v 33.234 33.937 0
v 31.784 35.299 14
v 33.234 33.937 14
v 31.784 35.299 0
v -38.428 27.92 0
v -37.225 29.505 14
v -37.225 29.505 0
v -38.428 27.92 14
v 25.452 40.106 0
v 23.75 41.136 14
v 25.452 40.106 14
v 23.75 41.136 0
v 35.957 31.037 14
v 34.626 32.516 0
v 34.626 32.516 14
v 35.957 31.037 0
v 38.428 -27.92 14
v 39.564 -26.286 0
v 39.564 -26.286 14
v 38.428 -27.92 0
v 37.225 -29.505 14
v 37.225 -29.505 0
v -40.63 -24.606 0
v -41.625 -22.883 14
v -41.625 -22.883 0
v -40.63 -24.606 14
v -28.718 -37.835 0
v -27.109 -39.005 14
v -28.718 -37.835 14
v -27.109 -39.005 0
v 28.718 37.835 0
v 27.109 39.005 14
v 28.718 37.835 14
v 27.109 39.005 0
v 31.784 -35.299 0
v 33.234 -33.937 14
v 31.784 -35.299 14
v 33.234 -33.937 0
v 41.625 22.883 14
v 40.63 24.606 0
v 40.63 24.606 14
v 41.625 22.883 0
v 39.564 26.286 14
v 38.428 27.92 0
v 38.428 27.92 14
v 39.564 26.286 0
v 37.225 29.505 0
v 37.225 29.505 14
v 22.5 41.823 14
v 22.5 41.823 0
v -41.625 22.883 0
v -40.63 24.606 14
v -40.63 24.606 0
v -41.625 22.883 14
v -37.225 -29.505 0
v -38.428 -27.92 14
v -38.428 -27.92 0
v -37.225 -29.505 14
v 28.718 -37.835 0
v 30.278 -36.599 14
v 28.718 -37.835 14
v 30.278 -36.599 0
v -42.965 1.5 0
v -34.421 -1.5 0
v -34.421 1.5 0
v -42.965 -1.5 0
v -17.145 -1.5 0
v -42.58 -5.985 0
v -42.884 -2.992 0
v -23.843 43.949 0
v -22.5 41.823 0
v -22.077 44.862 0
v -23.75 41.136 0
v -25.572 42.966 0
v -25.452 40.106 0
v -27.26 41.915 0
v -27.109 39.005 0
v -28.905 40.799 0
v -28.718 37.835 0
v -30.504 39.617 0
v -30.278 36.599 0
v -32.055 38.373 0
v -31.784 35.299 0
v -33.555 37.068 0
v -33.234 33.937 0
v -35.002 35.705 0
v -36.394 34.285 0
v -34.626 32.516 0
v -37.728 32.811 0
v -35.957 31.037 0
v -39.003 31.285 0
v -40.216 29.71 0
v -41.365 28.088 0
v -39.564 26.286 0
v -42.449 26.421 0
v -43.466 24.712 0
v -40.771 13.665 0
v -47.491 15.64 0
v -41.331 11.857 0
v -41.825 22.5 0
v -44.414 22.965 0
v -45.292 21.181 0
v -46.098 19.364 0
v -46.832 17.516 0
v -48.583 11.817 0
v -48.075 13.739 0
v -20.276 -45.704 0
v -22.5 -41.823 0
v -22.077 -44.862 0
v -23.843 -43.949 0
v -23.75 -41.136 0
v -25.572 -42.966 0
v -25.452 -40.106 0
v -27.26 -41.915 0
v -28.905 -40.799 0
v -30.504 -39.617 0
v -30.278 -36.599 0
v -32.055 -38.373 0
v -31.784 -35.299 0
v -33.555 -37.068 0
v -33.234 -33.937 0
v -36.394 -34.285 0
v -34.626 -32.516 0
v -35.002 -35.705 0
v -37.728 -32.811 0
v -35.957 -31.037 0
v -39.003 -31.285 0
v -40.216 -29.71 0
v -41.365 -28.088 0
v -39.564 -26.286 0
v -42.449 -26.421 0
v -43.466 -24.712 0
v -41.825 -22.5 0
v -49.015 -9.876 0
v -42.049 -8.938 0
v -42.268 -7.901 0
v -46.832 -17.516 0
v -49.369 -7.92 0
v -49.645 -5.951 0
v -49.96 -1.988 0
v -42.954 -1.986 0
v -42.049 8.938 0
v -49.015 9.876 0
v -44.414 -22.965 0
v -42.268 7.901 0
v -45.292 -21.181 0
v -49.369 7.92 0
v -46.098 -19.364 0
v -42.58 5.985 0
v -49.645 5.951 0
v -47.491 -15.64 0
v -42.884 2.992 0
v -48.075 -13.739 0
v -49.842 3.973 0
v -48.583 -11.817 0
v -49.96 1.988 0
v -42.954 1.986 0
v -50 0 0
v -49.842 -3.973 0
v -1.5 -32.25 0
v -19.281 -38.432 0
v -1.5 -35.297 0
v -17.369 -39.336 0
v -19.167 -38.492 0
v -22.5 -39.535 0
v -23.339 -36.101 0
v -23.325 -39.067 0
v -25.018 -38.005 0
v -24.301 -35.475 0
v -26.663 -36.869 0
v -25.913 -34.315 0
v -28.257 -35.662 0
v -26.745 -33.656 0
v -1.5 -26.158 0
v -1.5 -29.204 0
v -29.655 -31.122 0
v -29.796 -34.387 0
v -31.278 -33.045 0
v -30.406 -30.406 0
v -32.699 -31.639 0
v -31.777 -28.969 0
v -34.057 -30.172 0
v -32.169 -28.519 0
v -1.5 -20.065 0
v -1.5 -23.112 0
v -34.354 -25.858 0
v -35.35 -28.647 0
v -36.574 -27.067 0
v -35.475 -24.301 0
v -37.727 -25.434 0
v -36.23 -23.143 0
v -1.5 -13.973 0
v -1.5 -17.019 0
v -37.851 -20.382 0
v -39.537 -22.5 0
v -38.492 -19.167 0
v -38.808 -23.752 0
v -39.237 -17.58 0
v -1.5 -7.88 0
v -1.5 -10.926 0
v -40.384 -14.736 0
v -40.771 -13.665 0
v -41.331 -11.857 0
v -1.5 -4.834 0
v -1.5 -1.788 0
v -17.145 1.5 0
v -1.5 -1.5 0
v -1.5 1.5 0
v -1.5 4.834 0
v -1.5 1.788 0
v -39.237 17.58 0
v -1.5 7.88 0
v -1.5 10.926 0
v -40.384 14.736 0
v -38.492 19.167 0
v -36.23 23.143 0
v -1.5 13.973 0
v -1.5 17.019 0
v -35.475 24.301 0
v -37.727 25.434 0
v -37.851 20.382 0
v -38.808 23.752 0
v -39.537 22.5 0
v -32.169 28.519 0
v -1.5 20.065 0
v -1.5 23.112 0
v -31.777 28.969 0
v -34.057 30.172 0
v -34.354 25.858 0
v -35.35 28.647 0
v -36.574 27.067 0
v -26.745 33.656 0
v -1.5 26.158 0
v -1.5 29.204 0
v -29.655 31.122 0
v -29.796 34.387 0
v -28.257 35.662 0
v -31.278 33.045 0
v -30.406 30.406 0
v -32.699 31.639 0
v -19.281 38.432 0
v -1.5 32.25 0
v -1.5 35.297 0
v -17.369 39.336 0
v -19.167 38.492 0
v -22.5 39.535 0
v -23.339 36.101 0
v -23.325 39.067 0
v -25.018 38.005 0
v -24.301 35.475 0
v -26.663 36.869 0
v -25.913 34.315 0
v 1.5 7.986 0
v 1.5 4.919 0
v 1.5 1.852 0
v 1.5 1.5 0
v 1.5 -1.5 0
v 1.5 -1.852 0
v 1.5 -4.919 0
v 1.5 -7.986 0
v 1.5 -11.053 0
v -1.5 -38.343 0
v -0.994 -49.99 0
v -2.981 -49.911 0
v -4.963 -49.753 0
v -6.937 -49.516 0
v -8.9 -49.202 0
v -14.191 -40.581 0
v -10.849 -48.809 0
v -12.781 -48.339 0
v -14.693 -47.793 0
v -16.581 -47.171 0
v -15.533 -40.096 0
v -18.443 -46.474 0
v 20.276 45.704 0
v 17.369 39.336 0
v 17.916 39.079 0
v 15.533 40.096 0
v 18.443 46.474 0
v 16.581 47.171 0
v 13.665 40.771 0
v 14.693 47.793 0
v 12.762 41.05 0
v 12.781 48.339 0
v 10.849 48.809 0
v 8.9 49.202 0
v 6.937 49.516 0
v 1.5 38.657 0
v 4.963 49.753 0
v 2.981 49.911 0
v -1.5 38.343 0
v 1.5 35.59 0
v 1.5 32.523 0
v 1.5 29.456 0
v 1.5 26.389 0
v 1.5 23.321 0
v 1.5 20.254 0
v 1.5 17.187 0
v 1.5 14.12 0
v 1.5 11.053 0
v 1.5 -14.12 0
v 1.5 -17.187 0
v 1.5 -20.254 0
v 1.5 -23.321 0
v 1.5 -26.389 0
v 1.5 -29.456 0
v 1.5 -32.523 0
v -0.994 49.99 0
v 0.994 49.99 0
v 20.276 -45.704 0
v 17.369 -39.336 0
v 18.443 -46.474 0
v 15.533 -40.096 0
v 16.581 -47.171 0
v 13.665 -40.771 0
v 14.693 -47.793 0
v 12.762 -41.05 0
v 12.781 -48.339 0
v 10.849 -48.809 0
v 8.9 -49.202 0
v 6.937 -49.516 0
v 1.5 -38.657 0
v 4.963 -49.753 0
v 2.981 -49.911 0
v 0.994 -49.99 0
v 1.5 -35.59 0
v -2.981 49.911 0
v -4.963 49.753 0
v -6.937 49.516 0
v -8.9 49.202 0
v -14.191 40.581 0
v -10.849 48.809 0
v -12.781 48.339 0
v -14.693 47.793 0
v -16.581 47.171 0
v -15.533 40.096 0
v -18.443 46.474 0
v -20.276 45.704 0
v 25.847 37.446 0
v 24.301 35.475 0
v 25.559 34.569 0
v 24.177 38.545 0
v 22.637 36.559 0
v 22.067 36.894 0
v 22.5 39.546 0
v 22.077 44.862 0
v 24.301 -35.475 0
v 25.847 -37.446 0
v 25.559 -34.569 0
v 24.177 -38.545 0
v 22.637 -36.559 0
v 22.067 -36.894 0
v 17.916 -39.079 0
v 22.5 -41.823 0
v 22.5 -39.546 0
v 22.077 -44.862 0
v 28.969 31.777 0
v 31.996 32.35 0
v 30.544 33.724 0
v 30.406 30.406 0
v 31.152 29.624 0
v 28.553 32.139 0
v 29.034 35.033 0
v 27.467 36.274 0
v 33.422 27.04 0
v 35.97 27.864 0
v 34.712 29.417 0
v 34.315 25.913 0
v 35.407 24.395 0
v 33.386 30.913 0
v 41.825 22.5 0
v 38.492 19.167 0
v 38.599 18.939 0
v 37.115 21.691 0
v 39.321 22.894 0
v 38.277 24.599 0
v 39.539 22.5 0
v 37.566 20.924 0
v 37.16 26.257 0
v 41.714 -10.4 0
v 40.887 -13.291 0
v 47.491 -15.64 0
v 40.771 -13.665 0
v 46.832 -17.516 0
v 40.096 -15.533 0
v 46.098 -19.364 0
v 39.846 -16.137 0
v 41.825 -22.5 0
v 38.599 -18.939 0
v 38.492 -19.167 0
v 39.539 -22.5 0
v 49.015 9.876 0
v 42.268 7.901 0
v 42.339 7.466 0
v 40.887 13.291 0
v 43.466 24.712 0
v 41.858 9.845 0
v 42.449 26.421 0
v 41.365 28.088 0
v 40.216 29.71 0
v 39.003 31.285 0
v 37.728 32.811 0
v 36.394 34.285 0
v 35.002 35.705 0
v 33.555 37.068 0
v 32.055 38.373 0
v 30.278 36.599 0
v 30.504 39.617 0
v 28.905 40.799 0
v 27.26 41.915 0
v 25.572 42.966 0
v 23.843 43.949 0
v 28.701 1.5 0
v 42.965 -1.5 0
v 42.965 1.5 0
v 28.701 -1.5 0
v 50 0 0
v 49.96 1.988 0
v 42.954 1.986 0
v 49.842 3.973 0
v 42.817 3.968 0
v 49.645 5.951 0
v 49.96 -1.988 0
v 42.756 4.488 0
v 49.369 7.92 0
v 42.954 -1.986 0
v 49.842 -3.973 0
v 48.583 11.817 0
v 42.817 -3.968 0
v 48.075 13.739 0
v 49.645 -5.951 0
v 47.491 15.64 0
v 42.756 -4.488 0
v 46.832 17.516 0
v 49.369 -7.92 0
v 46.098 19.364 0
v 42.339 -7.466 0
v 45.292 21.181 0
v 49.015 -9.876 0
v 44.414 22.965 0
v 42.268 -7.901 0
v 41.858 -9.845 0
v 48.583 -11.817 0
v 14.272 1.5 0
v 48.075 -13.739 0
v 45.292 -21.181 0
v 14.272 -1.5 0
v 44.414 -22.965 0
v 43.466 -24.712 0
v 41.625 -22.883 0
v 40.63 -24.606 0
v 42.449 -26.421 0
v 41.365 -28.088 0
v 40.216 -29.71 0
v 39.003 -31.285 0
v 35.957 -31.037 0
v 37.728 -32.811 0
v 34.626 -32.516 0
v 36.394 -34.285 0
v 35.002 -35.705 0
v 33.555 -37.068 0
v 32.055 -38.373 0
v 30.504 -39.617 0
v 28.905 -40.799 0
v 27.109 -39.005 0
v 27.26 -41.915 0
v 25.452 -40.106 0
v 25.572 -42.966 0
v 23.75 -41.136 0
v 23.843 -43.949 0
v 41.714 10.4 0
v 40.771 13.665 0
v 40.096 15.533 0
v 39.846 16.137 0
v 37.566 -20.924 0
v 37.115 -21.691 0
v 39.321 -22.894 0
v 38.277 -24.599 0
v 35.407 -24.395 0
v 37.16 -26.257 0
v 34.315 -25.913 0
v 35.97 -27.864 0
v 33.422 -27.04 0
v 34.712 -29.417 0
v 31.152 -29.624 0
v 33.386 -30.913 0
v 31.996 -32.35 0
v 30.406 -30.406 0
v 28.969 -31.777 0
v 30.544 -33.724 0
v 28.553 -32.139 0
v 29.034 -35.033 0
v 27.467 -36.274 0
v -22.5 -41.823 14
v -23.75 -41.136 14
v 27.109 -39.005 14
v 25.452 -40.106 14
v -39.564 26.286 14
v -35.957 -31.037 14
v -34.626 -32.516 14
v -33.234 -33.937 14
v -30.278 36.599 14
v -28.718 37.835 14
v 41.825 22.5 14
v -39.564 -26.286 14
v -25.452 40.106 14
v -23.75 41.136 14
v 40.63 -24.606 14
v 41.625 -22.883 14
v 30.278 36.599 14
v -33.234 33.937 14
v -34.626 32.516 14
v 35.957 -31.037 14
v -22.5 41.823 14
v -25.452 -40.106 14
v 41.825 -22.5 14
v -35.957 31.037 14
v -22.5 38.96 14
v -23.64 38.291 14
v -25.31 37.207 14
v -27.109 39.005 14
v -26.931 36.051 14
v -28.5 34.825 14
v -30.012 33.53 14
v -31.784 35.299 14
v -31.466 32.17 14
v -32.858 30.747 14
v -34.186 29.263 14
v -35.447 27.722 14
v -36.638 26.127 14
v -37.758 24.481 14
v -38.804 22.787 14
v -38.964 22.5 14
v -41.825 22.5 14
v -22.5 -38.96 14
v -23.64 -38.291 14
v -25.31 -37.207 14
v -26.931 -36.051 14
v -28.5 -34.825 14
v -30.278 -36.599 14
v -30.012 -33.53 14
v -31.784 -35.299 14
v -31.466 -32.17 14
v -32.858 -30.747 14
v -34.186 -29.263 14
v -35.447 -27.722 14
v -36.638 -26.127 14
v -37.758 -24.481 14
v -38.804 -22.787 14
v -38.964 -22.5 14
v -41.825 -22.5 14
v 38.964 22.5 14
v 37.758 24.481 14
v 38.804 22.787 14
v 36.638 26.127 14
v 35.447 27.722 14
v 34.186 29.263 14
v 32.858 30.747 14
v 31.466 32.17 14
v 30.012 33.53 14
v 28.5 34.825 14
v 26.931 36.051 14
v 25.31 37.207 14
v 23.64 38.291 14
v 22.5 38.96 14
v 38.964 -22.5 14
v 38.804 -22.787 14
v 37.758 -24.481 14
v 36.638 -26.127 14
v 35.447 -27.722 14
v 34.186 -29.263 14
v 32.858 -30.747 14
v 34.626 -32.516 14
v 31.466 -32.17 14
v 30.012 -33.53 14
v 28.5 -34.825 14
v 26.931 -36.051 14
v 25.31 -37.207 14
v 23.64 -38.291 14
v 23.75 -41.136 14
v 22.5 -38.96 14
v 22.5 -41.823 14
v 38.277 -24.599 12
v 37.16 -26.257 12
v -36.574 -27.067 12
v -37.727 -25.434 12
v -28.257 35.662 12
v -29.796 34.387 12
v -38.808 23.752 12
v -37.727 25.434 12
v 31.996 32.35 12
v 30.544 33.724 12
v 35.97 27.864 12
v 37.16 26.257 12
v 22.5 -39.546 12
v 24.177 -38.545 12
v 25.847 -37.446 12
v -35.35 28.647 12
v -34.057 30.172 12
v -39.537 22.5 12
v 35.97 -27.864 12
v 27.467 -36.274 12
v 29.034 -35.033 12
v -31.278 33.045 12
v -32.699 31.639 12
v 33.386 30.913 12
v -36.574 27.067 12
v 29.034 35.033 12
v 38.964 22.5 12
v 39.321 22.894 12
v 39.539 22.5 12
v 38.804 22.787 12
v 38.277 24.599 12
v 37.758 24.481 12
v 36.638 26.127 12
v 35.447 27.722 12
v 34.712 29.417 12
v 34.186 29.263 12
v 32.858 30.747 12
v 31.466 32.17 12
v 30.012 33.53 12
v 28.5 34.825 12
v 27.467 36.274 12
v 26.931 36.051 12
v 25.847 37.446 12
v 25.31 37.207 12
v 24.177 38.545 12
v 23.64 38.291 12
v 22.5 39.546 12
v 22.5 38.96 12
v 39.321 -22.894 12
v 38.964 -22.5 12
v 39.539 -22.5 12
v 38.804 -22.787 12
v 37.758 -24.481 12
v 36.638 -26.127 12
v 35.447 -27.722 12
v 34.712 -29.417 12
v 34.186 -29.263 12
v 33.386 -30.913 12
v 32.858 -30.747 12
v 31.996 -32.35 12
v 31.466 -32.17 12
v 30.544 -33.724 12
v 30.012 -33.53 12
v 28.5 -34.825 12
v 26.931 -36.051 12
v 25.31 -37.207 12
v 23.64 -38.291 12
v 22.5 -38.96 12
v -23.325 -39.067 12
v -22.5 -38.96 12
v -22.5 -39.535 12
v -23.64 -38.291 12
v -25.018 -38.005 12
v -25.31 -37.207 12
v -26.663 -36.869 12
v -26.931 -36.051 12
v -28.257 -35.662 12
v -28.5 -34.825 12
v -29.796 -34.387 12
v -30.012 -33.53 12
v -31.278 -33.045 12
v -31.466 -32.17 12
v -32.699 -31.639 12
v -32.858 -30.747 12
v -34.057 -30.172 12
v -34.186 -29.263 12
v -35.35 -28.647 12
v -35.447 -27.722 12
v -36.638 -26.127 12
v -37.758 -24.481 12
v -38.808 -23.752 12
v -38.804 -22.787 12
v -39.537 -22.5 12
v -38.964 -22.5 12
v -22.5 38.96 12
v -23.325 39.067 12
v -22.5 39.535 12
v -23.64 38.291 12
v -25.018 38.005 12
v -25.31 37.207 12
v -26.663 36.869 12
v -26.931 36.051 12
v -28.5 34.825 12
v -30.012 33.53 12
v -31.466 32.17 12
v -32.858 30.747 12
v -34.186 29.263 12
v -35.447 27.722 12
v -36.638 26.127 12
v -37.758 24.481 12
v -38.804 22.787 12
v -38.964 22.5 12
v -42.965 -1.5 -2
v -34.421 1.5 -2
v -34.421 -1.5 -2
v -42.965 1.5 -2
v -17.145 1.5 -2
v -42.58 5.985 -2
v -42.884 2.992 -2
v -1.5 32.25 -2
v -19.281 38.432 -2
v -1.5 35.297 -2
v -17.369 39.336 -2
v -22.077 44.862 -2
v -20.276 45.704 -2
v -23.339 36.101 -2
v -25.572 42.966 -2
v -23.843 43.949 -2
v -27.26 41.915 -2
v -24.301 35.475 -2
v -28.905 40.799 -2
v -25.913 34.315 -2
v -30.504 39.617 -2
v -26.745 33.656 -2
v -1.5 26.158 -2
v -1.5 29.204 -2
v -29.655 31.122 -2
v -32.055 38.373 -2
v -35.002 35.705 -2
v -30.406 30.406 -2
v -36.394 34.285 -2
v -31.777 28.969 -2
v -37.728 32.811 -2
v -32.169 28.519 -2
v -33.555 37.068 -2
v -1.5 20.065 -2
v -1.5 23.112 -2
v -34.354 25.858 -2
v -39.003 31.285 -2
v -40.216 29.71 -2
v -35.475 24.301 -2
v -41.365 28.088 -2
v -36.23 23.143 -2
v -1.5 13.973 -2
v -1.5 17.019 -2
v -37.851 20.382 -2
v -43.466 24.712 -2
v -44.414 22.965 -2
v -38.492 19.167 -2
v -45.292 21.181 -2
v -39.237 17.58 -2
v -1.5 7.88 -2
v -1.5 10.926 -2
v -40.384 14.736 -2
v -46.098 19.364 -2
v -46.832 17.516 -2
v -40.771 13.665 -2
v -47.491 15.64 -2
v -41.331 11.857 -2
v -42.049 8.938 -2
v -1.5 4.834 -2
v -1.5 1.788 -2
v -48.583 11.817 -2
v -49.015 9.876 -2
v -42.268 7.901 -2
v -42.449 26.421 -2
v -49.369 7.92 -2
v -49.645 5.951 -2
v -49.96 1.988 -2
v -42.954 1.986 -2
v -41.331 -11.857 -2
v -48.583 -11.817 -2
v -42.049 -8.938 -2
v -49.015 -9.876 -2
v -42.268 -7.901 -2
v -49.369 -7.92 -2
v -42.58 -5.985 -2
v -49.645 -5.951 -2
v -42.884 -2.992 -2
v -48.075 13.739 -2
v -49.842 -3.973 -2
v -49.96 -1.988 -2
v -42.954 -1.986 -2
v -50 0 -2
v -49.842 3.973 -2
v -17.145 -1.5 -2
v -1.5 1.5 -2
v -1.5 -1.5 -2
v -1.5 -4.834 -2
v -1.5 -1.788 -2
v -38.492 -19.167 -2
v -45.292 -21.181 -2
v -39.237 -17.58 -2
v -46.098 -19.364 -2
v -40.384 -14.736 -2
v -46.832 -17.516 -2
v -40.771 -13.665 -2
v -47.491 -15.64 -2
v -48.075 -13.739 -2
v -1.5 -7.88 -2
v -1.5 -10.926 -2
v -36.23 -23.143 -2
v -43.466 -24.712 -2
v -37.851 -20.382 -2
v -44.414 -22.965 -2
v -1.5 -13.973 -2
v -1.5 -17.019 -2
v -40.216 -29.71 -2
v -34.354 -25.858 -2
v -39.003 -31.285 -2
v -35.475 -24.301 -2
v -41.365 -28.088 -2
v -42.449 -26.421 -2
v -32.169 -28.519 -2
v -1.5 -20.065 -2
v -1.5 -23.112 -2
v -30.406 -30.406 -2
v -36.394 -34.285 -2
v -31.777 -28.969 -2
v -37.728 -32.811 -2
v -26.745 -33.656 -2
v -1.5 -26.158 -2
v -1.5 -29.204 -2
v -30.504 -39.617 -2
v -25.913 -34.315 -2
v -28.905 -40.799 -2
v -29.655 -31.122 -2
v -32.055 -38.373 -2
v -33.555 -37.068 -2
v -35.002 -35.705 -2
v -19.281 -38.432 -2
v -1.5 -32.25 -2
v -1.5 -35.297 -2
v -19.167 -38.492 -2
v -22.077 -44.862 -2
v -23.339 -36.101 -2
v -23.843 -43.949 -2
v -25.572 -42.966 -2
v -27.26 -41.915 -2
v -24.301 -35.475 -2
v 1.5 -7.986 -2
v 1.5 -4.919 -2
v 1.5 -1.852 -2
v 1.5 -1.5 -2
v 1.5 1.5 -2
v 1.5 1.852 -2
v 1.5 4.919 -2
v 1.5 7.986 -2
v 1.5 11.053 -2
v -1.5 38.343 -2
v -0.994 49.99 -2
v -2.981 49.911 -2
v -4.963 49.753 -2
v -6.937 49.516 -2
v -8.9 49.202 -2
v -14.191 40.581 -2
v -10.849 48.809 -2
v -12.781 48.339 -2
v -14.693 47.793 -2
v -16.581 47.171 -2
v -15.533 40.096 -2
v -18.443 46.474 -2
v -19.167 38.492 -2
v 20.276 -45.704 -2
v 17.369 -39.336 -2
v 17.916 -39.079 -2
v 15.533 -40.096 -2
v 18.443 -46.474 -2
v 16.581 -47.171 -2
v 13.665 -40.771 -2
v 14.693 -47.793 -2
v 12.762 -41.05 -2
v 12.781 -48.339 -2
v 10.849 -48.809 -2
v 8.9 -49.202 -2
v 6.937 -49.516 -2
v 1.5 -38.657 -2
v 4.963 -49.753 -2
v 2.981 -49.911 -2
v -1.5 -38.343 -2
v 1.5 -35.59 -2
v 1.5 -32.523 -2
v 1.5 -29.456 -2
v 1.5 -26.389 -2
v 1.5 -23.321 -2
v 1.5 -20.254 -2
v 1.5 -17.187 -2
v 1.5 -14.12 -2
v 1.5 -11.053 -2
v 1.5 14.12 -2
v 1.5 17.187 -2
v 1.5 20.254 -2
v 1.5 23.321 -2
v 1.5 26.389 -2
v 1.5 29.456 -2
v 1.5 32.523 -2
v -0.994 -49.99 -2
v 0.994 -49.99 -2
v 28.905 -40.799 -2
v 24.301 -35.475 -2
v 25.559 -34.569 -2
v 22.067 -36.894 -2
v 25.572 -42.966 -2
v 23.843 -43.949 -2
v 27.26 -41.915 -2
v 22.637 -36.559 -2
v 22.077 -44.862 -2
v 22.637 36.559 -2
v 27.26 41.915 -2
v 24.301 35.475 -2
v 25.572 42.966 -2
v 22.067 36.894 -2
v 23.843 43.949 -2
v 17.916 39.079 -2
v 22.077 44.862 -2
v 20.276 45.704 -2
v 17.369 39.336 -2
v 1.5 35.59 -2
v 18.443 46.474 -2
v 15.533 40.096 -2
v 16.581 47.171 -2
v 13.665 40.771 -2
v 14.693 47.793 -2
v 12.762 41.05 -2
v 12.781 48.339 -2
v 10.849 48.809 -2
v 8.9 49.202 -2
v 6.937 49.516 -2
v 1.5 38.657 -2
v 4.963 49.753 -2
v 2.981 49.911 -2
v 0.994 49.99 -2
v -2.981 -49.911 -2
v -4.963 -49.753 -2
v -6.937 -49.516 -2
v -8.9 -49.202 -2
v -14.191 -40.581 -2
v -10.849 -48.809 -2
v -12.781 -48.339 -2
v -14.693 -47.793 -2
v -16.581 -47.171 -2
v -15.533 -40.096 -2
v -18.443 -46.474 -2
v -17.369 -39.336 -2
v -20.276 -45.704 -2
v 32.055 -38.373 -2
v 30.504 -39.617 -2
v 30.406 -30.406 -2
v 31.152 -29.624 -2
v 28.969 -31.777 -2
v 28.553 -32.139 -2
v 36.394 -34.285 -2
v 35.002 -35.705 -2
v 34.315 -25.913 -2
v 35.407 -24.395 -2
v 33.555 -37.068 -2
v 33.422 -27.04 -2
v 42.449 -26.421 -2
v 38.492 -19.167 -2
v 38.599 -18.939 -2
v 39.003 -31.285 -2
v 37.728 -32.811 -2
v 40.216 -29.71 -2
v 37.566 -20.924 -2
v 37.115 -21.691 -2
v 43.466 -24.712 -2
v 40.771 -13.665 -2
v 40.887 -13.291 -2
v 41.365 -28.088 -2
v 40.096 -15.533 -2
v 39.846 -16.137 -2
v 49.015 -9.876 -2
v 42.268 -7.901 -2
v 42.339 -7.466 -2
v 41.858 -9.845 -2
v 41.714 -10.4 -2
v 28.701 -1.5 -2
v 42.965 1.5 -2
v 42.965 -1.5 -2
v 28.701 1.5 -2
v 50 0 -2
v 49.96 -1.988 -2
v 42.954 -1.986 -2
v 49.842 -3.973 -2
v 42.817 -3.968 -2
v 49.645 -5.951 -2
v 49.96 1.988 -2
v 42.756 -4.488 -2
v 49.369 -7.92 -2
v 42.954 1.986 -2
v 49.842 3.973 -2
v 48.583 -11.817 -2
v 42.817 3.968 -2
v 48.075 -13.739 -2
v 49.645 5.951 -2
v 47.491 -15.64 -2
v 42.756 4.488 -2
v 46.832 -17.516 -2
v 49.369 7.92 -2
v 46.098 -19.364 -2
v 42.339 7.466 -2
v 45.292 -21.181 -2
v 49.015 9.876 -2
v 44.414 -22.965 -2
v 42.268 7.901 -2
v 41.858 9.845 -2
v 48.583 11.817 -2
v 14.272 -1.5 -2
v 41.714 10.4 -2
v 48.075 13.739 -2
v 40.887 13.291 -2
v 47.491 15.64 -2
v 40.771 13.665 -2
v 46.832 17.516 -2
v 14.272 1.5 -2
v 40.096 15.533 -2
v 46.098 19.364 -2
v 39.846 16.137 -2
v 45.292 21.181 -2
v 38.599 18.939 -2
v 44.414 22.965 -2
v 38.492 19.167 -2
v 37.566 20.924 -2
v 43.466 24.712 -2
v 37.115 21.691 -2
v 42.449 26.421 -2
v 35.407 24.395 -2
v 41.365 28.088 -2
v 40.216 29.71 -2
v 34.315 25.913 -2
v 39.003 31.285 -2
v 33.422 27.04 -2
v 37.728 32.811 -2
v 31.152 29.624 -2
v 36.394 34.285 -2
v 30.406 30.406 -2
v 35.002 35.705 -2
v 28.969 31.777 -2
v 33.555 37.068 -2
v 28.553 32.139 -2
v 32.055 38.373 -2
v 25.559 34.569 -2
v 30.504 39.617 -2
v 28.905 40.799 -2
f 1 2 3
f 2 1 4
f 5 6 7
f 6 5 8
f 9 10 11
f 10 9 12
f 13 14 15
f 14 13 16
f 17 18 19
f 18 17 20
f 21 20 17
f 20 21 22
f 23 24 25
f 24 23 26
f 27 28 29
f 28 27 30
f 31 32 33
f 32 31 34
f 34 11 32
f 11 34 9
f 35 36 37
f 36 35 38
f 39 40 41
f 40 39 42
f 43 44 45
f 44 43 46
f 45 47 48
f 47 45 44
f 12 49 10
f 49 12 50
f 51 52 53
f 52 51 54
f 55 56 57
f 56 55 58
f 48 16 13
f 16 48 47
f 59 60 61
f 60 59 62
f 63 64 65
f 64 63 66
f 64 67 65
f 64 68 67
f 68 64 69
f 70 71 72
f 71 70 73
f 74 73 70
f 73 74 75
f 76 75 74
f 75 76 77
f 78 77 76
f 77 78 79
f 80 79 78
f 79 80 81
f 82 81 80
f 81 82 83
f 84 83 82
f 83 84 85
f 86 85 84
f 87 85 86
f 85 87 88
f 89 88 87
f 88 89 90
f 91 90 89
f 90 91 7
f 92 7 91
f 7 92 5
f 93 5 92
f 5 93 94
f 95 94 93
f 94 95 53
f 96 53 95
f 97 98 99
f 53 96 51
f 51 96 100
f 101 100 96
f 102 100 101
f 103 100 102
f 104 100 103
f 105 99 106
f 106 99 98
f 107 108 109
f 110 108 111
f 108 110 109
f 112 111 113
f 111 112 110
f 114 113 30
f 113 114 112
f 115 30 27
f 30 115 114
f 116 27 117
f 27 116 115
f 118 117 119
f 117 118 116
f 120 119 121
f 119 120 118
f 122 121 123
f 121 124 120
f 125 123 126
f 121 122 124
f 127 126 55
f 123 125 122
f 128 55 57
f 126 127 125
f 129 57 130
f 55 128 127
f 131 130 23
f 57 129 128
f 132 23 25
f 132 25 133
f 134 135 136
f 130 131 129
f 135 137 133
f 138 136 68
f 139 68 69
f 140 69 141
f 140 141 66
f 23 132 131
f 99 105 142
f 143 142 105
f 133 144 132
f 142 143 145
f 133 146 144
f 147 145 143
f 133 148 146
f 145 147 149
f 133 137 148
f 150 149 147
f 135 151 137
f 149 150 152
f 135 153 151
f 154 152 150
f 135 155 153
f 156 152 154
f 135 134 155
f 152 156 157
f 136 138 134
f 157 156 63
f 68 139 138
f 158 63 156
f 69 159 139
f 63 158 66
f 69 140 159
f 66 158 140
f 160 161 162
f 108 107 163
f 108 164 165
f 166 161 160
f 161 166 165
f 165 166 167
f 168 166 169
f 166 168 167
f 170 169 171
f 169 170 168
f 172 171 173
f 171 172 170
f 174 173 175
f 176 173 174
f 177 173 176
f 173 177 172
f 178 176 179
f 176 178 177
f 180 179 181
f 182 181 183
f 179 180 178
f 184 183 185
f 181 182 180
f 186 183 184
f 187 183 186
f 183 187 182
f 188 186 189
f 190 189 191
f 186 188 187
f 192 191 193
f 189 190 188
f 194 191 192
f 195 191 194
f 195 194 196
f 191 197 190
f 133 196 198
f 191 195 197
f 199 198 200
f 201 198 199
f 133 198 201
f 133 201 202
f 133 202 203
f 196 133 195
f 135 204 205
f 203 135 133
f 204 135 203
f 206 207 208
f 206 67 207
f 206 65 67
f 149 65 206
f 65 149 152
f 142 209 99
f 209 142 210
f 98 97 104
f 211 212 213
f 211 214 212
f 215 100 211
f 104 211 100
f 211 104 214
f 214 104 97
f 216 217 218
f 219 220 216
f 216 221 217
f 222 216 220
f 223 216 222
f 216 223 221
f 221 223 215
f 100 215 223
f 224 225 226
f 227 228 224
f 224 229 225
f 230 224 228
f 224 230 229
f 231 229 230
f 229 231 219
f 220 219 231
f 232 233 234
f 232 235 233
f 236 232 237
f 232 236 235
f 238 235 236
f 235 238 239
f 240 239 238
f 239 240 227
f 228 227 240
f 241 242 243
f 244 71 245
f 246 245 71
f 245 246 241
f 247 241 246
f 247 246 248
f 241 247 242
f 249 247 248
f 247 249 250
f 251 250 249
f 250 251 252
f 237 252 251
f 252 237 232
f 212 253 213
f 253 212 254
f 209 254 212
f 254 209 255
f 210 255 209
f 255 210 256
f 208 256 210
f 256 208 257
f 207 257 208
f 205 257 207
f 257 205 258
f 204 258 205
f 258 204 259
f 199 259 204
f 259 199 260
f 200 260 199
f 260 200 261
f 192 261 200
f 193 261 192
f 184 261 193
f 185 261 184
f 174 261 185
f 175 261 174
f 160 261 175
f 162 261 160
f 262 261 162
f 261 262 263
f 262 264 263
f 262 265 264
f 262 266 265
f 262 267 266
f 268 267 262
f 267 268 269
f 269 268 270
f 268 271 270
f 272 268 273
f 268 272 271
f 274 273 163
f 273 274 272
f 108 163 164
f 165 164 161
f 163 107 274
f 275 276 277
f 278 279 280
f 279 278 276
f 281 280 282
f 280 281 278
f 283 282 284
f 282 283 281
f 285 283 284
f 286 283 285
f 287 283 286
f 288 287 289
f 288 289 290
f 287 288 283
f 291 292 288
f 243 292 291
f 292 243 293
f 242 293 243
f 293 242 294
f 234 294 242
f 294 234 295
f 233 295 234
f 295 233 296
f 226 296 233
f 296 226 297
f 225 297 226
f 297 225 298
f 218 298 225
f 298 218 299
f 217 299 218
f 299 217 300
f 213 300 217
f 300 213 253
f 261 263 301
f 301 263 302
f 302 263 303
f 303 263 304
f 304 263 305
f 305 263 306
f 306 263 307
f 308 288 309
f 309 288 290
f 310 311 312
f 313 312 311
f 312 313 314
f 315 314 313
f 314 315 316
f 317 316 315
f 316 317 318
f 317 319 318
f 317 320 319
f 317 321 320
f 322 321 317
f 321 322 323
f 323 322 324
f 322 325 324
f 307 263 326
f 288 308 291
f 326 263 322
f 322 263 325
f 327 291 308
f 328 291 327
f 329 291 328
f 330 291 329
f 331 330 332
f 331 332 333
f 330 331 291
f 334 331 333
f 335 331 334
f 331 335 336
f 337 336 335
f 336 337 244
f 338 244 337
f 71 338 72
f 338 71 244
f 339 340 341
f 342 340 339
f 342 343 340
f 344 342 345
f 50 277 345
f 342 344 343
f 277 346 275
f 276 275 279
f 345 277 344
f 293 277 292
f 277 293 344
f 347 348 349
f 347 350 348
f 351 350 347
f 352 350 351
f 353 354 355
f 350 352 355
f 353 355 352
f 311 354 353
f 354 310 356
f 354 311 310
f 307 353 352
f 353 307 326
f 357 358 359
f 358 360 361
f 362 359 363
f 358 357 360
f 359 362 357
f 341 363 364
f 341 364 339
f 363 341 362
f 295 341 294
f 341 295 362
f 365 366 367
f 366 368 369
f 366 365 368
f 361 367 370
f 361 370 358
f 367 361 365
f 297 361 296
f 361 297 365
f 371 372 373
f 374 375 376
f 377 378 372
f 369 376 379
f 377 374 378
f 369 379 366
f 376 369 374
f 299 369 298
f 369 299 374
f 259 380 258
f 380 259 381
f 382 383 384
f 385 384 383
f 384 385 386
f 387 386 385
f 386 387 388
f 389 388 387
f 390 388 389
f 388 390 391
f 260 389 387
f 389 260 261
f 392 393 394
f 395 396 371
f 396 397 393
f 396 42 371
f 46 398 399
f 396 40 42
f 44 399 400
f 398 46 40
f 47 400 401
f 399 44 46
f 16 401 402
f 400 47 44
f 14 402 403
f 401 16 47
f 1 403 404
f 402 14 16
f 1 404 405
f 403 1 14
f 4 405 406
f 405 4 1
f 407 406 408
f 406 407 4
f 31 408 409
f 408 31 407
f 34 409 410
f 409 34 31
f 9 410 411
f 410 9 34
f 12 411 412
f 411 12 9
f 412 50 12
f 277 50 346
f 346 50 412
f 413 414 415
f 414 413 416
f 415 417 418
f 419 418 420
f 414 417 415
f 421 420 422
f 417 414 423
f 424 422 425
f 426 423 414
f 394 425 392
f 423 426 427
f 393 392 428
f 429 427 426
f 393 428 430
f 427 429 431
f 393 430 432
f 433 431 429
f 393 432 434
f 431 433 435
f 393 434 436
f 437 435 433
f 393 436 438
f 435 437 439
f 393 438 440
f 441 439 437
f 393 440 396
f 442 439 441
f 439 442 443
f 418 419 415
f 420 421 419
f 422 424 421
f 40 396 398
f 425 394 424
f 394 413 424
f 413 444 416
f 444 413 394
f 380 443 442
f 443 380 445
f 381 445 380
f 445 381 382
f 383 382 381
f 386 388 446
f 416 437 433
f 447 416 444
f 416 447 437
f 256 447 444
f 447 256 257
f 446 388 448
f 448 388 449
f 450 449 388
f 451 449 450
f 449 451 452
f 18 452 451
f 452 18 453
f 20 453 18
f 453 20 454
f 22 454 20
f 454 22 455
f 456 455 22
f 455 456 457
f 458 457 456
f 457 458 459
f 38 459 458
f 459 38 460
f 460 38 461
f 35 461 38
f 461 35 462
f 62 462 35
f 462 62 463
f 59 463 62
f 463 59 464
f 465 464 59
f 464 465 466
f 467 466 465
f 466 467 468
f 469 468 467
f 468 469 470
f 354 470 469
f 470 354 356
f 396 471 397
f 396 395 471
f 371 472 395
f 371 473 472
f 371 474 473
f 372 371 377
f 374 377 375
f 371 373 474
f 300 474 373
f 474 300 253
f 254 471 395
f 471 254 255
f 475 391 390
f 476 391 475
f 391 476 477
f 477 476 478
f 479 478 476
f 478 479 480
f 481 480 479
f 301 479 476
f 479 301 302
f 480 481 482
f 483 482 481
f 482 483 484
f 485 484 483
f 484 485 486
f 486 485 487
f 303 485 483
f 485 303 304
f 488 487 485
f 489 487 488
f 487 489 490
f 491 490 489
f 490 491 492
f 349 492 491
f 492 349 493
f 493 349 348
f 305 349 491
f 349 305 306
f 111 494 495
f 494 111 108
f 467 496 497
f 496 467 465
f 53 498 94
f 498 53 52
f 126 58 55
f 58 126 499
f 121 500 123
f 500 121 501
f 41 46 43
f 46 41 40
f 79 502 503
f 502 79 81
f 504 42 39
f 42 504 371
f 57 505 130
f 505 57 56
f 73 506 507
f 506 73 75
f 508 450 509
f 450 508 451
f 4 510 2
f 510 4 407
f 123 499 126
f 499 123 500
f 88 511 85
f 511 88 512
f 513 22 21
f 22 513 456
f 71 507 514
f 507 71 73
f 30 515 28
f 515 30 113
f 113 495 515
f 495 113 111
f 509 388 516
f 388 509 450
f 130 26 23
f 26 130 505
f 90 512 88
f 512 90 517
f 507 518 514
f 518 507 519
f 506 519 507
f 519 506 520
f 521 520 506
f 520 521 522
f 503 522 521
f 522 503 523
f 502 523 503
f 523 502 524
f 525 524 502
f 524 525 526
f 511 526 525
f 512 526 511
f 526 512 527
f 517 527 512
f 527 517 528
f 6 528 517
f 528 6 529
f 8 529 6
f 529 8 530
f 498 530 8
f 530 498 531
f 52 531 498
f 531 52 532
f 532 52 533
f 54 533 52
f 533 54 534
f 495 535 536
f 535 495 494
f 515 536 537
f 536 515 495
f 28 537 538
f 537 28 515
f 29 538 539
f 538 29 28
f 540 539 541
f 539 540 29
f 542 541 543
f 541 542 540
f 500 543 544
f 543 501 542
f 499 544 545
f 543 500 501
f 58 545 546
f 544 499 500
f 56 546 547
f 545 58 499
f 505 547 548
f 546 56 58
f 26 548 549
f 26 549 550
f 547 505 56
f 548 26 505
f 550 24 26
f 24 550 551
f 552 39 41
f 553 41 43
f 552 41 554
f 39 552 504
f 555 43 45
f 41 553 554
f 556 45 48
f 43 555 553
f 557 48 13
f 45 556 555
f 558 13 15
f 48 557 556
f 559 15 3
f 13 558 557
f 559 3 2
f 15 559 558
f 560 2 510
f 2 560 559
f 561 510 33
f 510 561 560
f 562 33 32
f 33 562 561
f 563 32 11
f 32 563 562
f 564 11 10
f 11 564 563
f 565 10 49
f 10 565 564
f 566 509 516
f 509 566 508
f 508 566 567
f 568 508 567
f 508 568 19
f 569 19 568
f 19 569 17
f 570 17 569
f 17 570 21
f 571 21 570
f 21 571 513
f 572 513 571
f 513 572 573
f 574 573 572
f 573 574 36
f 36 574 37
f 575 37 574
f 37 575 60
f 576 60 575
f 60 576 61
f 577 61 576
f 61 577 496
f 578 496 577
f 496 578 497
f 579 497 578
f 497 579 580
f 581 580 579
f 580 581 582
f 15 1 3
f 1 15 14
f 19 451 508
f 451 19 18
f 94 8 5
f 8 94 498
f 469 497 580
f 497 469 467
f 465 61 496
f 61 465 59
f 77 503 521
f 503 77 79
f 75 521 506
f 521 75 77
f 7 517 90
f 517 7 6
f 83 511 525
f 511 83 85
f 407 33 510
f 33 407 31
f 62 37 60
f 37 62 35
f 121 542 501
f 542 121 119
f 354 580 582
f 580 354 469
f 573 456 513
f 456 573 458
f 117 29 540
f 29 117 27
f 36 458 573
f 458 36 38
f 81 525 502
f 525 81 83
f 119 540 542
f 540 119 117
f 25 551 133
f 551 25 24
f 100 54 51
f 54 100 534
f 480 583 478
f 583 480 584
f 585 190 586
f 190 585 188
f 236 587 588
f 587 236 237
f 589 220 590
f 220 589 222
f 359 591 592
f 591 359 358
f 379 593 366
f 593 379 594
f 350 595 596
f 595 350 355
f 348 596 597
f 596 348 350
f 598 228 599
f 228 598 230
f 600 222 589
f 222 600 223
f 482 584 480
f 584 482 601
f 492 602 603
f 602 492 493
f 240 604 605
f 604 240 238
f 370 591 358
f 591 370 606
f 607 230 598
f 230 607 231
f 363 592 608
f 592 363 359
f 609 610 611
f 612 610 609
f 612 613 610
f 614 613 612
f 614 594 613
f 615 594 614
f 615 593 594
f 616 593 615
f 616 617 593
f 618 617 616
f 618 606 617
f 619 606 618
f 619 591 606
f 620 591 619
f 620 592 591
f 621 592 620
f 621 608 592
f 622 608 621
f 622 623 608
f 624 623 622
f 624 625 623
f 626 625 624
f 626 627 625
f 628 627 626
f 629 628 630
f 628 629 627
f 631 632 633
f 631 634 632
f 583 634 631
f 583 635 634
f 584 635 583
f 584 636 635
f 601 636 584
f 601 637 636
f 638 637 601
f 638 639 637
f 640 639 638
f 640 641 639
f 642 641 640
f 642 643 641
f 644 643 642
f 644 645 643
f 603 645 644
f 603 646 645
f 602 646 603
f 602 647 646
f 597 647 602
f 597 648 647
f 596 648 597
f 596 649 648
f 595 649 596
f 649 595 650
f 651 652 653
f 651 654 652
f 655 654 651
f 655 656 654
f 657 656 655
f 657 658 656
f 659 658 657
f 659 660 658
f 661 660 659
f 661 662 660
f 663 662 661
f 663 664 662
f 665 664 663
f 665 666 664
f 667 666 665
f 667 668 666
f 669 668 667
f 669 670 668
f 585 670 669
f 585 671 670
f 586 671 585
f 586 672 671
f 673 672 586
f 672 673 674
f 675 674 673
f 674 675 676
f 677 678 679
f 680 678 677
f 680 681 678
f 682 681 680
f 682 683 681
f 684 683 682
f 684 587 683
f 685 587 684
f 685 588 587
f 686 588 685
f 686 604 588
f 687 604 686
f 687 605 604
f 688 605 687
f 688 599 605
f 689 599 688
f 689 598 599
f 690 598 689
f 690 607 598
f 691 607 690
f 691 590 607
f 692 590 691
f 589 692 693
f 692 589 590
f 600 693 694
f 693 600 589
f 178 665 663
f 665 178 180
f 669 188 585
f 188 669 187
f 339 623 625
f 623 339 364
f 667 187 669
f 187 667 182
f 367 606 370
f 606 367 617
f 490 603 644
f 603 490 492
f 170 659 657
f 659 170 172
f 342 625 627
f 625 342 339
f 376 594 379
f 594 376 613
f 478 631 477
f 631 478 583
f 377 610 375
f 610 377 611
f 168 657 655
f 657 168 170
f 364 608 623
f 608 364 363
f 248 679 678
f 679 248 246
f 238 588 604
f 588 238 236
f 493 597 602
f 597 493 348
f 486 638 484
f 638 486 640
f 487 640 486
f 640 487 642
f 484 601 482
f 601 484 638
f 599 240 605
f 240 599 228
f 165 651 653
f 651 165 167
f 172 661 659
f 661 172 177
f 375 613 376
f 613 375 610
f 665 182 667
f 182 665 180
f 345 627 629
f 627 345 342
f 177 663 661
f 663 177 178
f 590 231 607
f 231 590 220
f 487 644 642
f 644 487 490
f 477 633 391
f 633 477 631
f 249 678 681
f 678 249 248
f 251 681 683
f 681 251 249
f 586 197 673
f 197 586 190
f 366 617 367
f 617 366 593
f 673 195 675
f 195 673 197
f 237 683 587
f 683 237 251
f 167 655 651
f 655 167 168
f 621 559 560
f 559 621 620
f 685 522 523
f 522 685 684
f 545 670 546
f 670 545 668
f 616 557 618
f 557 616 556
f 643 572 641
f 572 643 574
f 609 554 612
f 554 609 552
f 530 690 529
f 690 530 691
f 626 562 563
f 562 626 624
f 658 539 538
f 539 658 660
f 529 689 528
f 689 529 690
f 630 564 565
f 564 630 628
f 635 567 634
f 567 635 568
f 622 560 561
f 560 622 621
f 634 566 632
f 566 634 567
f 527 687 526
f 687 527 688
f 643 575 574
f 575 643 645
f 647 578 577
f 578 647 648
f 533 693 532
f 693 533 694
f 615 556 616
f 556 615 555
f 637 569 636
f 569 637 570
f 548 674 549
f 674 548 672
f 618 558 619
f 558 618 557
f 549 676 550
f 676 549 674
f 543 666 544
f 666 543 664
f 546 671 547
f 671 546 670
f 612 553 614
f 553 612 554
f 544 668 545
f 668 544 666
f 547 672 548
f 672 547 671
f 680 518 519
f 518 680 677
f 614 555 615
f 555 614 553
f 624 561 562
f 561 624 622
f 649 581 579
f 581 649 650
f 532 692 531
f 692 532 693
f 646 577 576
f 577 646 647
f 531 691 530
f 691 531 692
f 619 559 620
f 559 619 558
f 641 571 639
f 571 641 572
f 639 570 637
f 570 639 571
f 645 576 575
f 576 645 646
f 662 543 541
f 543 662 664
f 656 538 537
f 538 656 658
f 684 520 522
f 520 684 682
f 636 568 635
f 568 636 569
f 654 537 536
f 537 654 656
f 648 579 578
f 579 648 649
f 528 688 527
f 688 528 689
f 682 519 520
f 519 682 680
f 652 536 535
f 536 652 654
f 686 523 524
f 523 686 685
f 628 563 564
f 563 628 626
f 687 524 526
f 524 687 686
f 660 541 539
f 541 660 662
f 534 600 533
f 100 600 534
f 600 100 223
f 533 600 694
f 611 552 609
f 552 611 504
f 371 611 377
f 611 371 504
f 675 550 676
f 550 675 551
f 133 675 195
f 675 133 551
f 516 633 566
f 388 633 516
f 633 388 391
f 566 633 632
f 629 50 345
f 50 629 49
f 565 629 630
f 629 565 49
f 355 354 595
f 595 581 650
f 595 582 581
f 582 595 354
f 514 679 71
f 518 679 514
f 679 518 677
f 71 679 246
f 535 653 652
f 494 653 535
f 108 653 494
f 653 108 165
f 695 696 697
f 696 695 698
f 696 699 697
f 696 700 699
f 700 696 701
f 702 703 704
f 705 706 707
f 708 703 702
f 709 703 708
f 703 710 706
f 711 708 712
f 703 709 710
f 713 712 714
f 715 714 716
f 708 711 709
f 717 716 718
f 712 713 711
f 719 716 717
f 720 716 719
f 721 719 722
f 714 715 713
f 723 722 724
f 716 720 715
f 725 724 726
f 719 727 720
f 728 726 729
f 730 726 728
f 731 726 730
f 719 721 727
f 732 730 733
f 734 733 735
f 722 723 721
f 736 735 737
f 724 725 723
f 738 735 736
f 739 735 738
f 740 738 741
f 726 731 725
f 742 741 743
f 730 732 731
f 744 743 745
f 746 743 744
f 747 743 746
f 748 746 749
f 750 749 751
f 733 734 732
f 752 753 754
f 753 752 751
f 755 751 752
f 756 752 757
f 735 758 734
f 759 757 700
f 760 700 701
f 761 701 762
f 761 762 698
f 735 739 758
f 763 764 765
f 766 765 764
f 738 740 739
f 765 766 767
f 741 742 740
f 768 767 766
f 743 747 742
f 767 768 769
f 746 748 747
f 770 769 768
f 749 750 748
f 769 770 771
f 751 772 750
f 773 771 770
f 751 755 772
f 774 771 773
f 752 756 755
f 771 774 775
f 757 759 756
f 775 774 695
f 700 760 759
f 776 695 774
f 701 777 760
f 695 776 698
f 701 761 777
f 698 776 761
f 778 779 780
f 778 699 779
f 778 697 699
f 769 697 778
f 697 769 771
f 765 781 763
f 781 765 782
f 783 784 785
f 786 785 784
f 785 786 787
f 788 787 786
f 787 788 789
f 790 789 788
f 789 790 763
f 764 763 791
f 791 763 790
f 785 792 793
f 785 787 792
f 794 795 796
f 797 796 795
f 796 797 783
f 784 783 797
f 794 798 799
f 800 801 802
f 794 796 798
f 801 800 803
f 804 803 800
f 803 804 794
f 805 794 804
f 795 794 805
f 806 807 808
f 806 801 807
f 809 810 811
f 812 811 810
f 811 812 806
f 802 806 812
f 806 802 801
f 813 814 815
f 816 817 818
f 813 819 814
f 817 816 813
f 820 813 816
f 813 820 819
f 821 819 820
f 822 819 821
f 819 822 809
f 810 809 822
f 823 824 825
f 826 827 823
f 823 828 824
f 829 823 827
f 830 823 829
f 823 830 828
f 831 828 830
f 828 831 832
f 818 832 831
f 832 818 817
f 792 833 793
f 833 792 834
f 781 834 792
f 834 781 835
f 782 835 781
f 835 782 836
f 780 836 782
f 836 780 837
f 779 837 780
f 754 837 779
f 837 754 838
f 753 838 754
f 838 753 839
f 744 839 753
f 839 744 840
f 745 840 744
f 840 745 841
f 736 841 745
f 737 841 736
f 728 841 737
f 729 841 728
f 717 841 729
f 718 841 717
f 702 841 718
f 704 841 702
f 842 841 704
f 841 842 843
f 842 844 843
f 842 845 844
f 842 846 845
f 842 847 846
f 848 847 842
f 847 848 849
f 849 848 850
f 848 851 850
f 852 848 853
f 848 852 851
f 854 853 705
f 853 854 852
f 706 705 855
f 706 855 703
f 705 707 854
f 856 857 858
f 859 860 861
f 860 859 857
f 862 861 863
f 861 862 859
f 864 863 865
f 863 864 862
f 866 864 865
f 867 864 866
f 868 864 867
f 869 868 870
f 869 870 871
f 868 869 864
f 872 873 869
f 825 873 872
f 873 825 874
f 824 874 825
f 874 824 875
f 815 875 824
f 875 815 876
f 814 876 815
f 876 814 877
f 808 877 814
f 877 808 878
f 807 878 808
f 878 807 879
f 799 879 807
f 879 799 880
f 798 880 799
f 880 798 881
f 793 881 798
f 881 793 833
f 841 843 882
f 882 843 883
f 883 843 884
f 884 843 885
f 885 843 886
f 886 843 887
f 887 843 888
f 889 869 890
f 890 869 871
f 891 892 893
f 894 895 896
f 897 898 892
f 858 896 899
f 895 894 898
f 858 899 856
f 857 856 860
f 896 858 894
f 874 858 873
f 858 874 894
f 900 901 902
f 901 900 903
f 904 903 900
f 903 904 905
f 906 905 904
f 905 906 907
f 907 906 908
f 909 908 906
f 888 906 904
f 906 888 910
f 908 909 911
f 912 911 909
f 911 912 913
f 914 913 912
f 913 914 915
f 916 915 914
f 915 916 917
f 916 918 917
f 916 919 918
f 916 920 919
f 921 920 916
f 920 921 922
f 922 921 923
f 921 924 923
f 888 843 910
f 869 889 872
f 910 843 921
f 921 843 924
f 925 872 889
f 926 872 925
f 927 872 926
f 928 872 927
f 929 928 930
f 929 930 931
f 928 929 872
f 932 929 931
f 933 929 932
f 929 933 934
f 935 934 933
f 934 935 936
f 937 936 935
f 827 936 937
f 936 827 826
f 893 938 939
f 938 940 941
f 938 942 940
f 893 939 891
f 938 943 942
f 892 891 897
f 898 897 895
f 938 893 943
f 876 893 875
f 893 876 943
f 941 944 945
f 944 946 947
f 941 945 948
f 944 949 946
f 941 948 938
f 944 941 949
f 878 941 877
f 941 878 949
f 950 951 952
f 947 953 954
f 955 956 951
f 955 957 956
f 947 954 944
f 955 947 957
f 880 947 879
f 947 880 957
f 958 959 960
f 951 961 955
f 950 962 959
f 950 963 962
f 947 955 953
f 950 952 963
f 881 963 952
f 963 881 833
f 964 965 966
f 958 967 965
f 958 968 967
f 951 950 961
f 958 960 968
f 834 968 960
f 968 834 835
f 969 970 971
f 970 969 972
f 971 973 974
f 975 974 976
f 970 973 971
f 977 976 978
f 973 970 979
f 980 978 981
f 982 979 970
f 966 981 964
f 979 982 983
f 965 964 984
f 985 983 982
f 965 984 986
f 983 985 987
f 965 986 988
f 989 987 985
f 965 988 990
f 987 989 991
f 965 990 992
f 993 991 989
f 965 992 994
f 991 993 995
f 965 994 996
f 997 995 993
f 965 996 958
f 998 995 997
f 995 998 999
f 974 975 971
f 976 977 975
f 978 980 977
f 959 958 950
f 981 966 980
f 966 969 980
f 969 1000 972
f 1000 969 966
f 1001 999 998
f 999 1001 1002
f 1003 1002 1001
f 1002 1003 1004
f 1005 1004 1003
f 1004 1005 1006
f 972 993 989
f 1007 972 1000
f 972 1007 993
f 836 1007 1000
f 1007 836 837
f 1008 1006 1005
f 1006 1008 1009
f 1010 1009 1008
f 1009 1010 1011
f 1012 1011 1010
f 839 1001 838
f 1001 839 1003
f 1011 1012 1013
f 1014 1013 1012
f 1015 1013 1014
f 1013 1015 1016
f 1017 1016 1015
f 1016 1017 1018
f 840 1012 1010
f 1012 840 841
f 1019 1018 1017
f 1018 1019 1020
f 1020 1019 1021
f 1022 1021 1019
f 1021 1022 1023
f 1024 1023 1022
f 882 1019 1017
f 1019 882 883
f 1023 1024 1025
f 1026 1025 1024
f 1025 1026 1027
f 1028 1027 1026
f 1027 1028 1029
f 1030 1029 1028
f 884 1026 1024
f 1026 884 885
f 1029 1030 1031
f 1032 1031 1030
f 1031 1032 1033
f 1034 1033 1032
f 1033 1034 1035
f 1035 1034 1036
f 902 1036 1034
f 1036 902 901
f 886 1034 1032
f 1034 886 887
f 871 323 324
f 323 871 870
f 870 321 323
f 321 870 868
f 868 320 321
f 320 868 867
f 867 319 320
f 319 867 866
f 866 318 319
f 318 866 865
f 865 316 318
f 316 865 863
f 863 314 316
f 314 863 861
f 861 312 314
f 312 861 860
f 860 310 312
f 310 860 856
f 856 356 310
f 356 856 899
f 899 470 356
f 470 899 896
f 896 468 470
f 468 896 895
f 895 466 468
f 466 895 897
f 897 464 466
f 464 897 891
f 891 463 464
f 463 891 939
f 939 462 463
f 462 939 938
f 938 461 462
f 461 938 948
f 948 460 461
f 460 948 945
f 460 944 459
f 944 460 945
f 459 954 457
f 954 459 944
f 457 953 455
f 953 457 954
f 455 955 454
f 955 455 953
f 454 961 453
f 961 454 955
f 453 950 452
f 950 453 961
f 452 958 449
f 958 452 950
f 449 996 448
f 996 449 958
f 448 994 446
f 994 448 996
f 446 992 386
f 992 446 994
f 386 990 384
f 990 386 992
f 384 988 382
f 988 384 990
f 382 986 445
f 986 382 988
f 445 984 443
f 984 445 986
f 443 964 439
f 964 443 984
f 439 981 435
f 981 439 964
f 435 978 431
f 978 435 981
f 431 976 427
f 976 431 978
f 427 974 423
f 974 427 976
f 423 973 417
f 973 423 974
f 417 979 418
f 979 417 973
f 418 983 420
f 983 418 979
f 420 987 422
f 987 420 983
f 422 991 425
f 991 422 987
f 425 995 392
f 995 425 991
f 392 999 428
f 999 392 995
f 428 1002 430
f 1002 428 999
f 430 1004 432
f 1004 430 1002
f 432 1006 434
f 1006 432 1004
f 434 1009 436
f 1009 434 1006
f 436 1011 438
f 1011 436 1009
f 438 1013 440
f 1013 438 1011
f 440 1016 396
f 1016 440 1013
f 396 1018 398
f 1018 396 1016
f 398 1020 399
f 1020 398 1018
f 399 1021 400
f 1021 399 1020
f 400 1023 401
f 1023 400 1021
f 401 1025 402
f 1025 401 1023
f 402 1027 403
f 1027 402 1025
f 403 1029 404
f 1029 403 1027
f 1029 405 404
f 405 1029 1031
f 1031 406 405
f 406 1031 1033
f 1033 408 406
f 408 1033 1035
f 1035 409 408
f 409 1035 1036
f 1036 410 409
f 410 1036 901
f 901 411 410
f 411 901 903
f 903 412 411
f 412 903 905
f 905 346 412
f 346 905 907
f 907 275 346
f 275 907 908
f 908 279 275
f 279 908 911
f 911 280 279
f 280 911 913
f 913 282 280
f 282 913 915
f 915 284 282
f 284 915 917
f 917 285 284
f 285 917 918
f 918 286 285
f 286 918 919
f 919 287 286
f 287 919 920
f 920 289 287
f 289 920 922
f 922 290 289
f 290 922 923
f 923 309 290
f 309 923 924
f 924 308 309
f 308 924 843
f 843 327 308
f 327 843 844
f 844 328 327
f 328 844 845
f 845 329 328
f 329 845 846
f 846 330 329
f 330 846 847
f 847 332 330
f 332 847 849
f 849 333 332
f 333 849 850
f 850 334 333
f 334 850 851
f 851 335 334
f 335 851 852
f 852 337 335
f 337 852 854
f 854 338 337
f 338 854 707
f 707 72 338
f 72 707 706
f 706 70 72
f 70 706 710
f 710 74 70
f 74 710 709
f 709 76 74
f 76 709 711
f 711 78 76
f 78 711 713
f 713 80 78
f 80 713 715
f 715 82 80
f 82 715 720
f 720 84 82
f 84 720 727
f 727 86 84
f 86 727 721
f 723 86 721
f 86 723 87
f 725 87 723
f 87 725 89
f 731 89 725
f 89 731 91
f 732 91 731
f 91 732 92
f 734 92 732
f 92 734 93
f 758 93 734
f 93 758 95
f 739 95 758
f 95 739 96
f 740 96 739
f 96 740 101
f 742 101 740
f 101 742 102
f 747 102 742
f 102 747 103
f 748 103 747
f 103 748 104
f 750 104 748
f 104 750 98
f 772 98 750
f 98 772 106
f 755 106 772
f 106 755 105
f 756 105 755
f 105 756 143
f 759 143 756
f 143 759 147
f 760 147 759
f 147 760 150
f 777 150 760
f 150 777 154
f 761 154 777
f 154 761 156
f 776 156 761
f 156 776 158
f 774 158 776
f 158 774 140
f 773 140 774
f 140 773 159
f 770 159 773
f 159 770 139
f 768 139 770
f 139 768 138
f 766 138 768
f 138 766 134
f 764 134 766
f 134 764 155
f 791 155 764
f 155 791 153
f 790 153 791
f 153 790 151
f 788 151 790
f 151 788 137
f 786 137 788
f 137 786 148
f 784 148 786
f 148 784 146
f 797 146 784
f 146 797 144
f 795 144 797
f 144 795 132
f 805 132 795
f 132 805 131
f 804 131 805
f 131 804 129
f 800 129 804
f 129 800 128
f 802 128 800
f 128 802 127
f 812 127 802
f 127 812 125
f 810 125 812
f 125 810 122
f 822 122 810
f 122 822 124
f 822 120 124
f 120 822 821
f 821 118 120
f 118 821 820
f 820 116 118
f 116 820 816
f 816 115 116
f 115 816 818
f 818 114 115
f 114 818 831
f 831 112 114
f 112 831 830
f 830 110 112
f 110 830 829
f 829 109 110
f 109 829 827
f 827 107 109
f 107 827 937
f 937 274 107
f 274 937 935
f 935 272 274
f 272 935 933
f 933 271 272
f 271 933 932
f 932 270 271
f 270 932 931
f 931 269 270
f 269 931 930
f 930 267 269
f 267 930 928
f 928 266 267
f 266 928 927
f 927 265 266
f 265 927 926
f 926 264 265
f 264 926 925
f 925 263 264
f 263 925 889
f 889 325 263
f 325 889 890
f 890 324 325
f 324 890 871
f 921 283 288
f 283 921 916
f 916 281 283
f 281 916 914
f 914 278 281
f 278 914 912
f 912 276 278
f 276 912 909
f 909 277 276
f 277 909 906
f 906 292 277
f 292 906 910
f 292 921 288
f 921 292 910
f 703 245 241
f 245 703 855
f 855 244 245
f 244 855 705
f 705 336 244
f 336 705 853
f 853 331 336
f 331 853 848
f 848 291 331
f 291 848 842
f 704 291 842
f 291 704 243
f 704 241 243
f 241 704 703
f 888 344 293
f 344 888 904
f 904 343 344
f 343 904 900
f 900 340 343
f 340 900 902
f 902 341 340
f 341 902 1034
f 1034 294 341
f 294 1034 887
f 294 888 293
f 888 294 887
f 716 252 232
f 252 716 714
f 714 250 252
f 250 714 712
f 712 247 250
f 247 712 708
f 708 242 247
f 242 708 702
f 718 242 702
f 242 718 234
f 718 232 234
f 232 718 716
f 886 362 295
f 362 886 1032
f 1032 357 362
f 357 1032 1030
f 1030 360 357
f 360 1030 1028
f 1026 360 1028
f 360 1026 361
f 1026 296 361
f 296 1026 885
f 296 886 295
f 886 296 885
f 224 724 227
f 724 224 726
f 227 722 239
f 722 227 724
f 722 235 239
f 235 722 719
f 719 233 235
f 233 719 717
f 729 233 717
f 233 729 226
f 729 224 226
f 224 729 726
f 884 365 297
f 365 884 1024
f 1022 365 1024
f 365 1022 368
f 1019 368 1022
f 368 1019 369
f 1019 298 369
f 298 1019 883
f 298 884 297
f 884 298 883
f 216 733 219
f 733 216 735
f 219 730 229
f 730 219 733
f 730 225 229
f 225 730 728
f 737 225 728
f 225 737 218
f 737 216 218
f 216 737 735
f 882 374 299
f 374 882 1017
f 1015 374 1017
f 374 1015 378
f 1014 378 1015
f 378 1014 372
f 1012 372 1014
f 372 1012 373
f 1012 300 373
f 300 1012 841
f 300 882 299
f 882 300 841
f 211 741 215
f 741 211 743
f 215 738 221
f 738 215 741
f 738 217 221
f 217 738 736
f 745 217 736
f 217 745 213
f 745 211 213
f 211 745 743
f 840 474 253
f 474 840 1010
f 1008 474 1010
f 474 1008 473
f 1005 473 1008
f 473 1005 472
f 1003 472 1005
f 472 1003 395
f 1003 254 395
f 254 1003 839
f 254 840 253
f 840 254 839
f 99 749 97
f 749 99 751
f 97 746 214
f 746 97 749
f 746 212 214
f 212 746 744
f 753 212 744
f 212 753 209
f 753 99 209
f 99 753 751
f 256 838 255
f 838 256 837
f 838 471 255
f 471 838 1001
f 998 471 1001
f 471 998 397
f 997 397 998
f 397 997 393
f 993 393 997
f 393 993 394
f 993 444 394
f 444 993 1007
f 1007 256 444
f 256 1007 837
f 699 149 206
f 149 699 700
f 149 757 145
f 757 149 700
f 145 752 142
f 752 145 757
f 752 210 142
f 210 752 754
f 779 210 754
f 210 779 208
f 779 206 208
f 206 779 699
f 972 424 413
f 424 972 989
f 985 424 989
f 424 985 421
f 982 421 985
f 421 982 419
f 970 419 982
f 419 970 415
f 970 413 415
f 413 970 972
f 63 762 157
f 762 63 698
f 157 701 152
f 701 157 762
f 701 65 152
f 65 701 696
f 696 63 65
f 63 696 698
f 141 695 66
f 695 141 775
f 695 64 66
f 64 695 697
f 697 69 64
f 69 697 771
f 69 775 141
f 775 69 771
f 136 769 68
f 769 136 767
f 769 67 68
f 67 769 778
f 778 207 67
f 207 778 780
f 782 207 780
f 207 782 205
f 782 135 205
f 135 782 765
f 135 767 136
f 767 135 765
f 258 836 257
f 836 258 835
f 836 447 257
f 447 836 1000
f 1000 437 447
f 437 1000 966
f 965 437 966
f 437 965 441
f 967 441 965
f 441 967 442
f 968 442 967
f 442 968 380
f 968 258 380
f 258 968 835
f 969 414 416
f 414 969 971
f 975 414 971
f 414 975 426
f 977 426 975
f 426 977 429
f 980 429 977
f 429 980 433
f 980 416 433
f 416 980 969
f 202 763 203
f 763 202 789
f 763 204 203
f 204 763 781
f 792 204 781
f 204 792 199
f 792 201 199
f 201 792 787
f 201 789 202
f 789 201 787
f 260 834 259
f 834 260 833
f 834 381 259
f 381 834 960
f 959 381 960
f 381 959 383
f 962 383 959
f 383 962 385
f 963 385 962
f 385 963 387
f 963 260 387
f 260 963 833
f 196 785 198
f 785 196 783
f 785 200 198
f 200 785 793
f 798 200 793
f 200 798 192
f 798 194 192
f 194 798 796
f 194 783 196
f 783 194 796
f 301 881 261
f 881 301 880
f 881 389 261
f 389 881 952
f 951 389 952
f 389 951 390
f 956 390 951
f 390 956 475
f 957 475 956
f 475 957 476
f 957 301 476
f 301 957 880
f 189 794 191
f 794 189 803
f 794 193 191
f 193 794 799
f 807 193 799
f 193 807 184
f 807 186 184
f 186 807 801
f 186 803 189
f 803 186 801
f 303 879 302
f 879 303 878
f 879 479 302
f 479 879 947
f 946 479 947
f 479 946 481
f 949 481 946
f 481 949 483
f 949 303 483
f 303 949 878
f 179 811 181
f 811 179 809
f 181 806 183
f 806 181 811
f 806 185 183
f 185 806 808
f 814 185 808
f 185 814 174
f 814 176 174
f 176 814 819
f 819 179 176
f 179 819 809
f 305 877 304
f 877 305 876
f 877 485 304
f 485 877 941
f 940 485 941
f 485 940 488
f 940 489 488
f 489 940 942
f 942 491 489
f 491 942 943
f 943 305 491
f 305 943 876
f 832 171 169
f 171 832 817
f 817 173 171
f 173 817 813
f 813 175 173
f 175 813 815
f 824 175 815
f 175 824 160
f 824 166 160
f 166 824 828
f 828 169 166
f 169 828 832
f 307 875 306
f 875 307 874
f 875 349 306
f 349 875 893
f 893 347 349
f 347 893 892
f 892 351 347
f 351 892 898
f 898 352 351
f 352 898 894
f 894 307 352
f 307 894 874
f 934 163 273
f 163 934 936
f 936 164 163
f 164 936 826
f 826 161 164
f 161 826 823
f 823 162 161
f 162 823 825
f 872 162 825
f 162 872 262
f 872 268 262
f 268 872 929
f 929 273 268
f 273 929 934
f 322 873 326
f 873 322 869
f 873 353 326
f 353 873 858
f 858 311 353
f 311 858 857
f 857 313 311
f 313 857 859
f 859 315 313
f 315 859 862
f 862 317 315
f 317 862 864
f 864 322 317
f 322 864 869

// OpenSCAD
$fa=0.2;
$fn=0;

/*                                                 -*- c++ -*-
 * A Carey mask generator.
 * Units in mm, default values are for
 * a Canon EOS 400mm
 *
 * Copyright 2013-2014, Brent Burton
 * Amended by Richard Chapman
 * License: CC-BY-SA
 *
 * Updated: 2014-06-23
 */

// This is the diameter of the mask.
outerDiameter = 102; // [80:400]

// The telescope light's path diameter.
aperture = 86; // [80:400]

// Diameter of secondary mirror holder. If no secondary, set to 0.
centerHoleDiameter = 0; // [0:90]

// Width of the gaps and the bars.
gap = 3; // [3:10]

// Thickness of mask
thickness = 2; // [1:3]

// Diameter ears need to fit over
earDiameter = 90;

// Height of ears
earHeight = 14;

/* create a series of bars covering roughly one half of the
 * scope aperture. Located in the +X side.
 */
module bars(gap, width, num=5) {
    num = round(num);
    for (i=[-num:num]) {
        translate([width/2,i*2*gap]) square([width,gap], center=true);
    }
}

module careyBars(gap,width) {
    numBars = aperture/2 / gap / 2 - 1;
    // Those on the RHS are angled at 12 degrees
    intersection() {
        rotate([0,0,12]) bars(gap, width, numBars);
        square([outerDiameter/2, outerDiameter/2], center=false);
    }
    intersection() {
        rotate([0,0,-12]) bars(gap, width, numBars);
        translate([0,-outerDiameter/2]) square([outerDiameter/2, outerDiameter/2], center=false);
    }
    // And those on the LHS are angled at 10 degrees
    rotate([0,0,180]) {
        intersection() {
            rotate([0,0,10]) bars(gap, width, numBars);
            square([outerDiameter/2, outerDiameter/2], center=false);
        }
        intersection() {
            rotate([0,0,-10]) bars(gap, width, numBars);
            translate([0,-outerDiameter/2]) square([outerDiameter/2, outerDiameter/2], center=false);
        }
    }
}

module carey2D() {
    width = aperture/2;
    difference() {                          // overall plate minus center hole
        union() {
            difference() {                  // trims the mask to aperture size
                circle(r=aperture/2+1);
                careyBars(gap,width);
            }
            difference() {                  // makes the outer margin
                circle(r=outerDiameter/2-1);
                circle(r=aperture/2);
            }
            // Add horizontal and vertical structural bars:
            square([gap,2*(aperture/2+1)], center=true);
            translate([0,0]) square([aperture+1,gap], center=true);
            // Add center hole margin if needed:
            if (centerHoleDiameter > 0 && centerHoleDiameter < outerDiameter) {
                circle(r=(centerHoleDiameter+gap)/2);
            }
        }
        // subtract center hole if needed
        if (centerHoleDiameter > 0 && centerHoleDiameter < outerDiameter) {
            circle(r=centerHoleDiameter/2+1);
        }
    }
}

// Ears to hold onto 400mm lens

difference()
{
  cylinder(r=earDiameter/2 + 2.5,h=earHeight);
  cylinder(r=earDiameter/2 + 0.5,h=earHeight-2);
  cylinder(r=earDiameter/2,h=earHeight);
  translate([-(earDiameter+10)/2,-earDiameter/4,0]) cube([earDiameter+10,earDiameter/2,earHeight]);
  translate([-earDiameter/4,-(earDiameter+10)/2,0]) cube([earDiameter/2,earDiameter+10,earHeight]);
}

// Mask
translate([0,0,-thickness]) 
   linear_extrude(height=thickness) carey2D();
